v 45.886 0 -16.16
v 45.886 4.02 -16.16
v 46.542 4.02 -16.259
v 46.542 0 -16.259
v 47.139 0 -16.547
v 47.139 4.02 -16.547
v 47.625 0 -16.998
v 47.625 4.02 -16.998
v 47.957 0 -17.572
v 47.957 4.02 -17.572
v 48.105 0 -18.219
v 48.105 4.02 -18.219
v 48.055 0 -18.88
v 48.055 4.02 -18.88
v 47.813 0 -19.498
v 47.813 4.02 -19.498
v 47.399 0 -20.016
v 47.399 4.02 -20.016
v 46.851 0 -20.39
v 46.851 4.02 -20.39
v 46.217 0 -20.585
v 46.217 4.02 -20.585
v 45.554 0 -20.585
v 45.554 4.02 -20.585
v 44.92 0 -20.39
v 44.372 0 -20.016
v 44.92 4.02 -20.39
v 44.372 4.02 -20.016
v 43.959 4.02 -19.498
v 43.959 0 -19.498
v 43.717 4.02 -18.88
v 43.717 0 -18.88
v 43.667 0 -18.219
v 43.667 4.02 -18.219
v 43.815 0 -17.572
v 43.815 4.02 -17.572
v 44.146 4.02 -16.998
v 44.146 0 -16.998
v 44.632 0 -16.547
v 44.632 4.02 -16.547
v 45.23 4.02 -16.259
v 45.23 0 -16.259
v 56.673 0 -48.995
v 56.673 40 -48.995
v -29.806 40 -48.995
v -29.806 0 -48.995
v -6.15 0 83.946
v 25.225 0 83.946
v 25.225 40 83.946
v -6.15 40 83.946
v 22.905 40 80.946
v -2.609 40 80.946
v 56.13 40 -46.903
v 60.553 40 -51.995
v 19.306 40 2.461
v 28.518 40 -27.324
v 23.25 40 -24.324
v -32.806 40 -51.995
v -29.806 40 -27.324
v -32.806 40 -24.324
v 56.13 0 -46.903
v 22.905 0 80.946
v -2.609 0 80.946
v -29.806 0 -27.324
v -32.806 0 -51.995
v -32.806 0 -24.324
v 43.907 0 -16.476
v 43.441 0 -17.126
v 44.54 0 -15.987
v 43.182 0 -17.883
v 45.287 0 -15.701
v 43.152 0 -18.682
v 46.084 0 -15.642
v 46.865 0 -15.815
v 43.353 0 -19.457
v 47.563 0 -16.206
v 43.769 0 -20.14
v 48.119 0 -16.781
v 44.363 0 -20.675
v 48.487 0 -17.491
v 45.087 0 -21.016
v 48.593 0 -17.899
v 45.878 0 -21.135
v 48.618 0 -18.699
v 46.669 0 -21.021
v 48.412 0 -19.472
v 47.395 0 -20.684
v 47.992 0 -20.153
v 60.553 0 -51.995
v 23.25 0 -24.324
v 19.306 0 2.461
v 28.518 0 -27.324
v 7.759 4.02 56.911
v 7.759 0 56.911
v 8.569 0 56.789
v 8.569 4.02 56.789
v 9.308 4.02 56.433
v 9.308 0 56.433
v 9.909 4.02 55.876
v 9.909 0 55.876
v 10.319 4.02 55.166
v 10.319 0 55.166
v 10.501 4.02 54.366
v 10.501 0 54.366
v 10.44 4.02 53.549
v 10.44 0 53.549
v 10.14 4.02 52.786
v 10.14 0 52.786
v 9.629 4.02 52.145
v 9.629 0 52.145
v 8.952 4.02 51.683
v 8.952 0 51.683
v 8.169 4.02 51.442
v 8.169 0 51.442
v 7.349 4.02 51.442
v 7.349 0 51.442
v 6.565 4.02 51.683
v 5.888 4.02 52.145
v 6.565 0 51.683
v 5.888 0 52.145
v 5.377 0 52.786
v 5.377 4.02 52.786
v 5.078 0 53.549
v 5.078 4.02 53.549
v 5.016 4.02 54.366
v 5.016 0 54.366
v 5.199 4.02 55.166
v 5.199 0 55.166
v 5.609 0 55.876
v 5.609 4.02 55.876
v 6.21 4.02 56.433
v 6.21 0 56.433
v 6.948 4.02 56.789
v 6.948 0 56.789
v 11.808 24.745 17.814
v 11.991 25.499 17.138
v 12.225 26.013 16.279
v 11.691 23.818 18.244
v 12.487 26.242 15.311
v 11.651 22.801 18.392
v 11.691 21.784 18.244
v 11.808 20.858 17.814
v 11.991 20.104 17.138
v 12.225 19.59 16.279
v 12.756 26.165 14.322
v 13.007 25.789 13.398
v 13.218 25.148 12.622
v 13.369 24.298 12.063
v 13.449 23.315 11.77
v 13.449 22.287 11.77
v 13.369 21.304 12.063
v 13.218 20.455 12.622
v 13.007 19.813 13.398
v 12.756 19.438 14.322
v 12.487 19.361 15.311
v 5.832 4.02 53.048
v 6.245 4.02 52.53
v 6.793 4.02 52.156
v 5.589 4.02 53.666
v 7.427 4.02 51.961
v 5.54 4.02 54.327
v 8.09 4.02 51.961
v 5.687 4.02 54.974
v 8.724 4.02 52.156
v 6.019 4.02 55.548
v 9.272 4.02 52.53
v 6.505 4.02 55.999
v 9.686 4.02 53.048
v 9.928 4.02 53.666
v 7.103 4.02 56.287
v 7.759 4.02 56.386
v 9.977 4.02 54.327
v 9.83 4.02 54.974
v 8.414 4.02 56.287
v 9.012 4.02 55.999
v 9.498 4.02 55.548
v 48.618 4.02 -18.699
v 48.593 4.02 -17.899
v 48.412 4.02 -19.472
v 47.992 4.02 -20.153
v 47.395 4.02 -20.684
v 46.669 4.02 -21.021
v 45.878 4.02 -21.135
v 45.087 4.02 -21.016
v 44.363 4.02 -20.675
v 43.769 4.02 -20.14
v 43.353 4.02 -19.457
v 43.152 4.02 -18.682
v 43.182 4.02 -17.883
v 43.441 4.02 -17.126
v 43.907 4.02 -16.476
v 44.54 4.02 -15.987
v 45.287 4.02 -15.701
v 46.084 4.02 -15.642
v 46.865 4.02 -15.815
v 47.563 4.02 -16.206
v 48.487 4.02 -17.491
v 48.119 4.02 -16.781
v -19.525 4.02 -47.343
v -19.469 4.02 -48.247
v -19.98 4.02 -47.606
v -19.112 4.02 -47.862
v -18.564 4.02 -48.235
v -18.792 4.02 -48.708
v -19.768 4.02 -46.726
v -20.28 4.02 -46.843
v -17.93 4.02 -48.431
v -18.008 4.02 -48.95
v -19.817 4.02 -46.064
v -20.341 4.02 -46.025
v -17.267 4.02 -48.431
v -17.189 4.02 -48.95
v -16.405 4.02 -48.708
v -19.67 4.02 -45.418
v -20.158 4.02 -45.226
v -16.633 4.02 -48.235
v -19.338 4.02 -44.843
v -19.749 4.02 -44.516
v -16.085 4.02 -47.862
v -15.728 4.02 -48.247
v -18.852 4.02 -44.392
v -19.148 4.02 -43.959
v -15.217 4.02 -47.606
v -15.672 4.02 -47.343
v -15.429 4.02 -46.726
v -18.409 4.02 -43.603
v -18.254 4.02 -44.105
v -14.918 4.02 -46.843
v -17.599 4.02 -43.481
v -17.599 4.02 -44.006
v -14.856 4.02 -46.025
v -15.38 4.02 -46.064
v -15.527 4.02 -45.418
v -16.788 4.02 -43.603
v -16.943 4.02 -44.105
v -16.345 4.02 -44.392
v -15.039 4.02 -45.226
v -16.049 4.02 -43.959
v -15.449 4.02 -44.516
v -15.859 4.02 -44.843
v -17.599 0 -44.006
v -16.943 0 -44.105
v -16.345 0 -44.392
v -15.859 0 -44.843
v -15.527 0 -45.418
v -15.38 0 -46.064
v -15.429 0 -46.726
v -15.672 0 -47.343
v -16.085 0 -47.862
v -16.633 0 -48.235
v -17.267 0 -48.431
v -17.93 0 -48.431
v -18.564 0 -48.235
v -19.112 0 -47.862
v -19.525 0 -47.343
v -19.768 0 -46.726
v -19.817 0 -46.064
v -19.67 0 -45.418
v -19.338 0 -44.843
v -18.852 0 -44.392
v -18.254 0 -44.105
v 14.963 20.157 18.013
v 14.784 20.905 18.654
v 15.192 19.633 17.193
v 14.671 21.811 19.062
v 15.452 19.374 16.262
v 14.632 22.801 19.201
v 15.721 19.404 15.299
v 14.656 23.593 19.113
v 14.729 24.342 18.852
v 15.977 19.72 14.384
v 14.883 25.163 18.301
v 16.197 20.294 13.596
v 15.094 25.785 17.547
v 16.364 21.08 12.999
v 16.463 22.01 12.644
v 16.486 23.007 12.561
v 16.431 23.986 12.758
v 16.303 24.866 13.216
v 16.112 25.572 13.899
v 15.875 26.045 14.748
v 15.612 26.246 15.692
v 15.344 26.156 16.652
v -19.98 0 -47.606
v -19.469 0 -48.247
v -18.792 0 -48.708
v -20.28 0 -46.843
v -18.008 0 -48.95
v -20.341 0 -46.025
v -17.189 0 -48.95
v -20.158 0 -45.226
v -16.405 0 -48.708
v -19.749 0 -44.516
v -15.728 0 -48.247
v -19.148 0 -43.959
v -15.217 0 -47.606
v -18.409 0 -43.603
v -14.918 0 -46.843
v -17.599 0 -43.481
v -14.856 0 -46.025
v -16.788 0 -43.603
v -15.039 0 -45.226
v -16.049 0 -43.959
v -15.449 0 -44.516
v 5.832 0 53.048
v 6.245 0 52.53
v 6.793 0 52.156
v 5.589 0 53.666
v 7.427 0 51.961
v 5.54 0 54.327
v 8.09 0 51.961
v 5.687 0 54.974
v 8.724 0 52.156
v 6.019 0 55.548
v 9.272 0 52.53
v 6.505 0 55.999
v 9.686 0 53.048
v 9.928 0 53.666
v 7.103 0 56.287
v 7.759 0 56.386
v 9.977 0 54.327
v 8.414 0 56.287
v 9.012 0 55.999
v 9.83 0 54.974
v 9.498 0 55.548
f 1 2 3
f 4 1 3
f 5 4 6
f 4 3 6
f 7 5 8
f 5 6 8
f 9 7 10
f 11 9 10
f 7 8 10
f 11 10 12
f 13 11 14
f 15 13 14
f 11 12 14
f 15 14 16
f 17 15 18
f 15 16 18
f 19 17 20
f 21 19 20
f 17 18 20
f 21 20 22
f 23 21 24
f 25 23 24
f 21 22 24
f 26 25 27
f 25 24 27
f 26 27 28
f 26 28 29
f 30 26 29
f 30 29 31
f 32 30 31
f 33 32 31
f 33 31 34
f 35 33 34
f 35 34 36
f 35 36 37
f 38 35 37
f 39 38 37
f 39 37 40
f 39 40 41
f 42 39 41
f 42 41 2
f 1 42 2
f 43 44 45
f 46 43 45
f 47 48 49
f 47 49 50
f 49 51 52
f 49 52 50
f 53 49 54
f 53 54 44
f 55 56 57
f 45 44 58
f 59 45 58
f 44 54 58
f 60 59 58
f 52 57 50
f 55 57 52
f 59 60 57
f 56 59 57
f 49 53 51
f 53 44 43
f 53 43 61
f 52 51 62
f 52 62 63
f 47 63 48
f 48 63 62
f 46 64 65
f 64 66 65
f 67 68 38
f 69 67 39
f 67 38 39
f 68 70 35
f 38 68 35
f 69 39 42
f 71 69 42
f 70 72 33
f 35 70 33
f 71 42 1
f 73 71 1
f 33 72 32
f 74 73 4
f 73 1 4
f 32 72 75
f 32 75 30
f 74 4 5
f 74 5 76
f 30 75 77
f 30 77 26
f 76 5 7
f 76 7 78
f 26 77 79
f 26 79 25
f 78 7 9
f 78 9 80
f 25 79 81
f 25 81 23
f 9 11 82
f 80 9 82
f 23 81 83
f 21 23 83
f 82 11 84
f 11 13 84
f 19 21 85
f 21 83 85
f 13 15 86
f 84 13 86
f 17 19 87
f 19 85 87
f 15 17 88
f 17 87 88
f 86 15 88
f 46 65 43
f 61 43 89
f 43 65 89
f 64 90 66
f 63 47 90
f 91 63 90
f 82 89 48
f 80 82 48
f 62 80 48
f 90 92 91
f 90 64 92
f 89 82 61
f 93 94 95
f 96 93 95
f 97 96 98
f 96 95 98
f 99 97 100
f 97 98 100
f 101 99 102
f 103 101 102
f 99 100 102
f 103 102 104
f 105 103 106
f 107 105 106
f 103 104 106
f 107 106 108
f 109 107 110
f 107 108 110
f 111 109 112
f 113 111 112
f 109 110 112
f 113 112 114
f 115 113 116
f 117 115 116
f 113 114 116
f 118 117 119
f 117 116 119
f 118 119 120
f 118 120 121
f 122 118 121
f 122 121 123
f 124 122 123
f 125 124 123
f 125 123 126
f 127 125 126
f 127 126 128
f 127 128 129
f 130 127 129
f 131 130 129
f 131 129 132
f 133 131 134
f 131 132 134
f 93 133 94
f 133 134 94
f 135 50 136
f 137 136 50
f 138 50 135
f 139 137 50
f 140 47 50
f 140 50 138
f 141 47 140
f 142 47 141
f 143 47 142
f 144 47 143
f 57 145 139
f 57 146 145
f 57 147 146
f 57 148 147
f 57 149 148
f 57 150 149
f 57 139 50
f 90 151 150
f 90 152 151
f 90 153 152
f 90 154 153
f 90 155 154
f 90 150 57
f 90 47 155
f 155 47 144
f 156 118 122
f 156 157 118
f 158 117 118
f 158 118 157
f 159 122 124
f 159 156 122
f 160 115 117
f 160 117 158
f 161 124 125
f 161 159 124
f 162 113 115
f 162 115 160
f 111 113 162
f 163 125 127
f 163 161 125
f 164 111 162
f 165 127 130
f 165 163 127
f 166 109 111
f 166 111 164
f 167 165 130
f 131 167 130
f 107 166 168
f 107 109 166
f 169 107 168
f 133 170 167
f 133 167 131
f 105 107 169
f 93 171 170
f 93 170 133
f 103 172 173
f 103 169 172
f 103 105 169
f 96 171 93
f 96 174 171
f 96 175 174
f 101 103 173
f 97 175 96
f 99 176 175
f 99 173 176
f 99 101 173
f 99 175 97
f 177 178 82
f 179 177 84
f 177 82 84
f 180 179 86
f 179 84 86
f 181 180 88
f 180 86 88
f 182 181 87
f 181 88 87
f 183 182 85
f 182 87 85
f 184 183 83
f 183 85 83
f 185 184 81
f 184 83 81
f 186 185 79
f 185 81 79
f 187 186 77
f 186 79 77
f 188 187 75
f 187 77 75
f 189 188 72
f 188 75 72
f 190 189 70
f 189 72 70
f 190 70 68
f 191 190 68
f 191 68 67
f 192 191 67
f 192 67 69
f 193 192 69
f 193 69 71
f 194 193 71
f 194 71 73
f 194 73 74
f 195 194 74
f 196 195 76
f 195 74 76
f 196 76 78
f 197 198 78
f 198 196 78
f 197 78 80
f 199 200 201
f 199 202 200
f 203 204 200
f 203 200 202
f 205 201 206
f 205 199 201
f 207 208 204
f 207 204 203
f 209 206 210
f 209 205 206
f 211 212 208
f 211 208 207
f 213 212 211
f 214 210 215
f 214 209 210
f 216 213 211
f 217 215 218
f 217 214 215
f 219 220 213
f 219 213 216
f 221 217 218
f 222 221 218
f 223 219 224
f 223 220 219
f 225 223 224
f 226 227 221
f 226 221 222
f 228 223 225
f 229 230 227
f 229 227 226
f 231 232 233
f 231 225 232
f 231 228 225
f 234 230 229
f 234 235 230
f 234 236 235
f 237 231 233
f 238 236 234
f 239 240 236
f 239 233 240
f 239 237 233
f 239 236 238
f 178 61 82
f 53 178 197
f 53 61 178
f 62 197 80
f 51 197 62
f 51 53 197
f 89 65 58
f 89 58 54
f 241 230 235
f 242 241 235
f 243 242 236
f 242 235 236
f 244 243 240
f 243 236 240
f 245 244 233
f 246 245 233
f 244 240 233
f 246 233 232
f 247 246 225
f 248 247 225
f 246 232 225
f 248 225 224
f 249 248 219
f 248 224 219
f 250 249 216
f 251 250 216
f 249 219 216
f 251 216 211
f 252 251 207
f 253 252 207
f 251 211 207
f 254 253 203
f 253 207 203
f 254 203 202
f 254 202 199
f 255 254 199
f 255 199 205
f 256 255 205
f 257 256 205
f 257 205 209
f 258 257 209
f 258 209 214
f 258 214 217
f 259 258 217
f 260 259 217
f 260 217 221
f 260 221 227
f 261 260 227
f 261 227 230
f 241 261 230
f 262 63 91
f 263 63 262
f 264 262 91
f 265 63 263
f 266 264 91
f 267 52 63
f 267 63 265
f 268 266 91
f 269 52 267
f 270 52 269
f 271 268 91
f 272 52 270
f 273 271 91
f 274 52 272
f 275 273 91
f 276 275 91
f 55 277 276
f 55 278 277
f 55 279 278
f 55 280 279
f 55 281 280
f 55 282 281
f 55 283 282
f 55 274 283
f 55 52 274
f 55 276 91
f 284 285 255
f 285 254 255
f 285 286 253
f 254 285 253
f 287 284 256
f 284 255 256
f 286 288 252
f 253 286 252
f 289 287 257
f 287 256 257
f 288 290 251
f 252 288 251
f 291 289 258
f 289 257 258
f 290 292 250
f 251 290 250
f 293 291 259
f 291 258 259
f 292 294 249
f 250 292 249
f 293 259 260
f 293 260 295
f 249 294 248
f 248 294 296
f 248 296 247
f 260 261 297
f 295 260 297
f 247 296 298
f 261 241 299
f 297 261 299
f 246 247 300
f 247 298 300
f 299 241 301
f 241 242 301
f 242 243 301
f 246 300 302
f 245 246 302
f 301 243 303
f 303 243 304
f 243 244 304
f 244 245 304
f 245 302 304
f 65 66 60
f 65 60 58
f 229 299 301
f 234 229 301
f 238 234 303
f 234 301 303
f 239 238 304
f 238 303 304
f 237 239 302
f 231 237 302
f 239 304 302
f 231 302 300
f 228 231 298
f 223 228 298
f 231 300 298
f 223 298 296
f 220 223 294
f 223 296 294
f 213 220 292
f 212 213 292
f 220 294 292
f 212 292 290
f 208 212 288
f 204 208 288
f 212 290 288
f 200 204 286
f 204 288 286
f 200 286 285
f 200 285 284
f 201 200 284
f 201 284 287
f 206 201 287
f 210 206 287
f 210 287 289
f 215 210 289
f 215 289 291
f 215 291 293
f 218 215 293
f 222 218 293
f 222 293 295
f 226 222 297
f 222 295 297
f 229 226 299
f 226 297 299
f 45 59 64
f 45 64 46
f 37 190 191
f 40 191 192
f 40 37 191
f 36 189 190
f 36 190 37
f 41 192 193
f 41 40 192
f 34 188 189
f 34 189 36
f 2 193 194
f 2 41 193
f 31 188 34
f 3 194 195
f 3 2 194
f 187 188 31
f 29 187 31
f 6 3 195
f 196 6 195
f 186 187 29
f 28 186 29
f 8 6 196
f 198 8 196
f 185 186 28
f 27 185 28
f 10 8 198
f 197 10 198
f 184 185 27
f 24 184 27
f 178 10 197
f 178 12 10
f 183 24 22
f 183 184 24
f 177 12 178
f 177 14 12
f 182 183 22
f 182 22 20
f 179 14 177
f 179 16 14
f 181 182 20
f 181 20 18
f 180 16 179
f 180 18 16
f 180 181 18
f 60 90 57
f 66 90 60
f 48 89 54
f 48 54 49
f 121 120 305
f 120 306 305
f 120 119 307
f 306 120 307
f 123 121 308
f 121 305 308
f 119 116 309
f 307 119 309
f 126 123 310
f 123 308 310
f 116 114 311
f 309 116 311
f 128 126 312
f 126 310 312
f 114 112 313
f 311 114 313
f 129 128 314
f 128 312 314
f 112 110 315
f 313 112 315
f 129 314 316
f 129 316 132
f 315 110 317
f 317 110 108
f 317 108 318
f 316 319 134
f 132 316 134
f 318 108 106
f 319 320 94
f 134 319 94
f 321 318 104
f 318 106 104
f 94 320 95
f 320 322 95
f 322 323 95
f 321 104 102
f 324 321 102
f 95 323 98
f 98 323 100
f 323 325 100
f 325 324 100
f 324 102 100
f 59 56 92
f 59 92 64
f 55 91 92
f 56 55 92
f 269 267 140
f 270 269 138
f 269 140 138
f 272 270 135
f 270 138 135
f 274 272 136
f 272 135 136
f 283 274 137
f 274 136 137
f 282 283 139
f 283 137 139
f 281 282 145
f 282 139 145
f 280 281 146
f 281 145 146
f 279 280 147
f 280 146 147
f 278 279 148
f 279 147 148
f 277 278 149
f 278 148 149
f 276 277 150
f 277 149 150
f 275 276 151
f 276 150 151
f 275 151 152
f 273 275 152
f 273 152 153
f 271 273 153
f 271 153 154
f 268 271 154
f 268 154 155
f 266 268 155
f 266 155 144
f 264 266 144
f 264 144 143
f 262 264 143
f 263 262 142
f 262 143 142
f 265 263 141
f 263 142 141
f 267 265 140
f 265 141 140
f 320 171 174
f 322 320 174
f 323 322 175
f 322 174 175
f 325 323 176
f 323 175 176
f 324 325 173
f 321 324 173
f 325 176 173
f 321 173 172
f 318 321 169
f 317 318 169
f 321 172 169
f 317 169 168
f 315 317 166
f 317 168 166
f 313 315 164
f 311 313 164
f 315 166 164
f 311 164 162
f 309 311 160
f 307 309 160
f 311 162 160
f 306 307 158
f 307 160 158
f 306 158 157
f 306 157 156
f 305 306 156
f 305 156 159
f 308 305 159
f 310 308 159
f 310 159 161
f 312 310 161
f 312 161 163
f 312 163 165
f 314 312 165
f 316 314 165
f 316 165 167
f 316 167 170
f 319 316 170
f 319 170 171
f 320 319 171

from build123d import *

# Parameters (mm, degrees)
BOSS_EXTRUDE1_DEPTH = 40
CUT_EXTRUDE1_DEPTH  = 111.966839961
SKETCH6_R           = 3.45
CUT_EXTRUDE2_DEPTH  = 10
SKETCH7_R           = 2.75
BOSS_EXTRUDE3_DEPTH = 4.02
SKETCH8_R           = 2.225
CUT_EXTRUDE3_DEPTH  = 110.581932685


with BuildPart() as part:
    # Sketch1 → Boss-Extrude1 (new body)
    with BuildSketch(Plane(origin=(0, 0, 0), x_dir=(1, 0, 0), z_dir=(0, 1, 0))):
        Polygon((-32.806430064, 51.994551896), (60.552740485, 51.994551896), (25.225039266, -83.946442395), (-6.149932227, -83.946442395), (23.249976258, 24.323717363), (-32.806430064, 24.323717363), align=None)
    extrude(amount=BOSS_EXTRUDE1_DEPTH)

    # Sketch3 → Cut-Extrude1 (cut, through all)
    with BuildSketch(Plane(origin=(0, 40, 0), x_dir=(1, 0, 0), z_dir=(0, 1, 0))):
        Polygon((56.180799988, 48.994551896), (56.673466926, 48.994551896), (56.129977884, 46.90320606), (22.905017266, -80.946442395), (-2.608781808, -80.946442395), (19.305922239, -2.461259631), (28.517713947, 27.323717363), (-29.806430064, 27.323717363), (-29.806430064, 48.994551896), (-0.992743821, 48.994551896), align=None)
    extrude(amount=-CUT_EXTRUDE1_DEPTH, mode=Mode.SUBTRACT)

    # Sketch6 → Cut-Extrude2 (cut)
    with BuildSketch(Plane(origin=(15.502019252, 0, 4.209451139), x_dir=(-0.2620526895610605, 0, 0.9650535673701303), z_dir=(-0.9650535673701304, 0, -0.2620526895610605))):
        with Locations((11.246173588, 22.801195515)):
            Circle(SKETCH6_R)
    extrude(amount=-CUT_EXTRUDE2_DEPTH, mode=Mode.SUBTRACT)

    # Sketch7 → Boss-Extrude3 (add)
    with BuildSketch(Plane(origin=(0, 0, 0), x_dir=(1, 0, 0), z_dir=(0, 1, 0))):
        with Locations(Location((-17.598579061, 46.230759465, 0), (0, 0, 270))):
            Circle(SKETCH7_R)
        with Locations((45.885843259, 18.385111047)):
            Circle(SKETCH7_R)
        with Locations(Location((7.758668696, -54.160966994, 0), (0, 0, 270))):
            Circle(SKETCH7_R)
    extrude(amount=BOSS_EXTRUDE3_DEPTH)


with BuildPart() as boss_extrude3_piece_1:
    # of the separate pieces the step leaves, piece 1, a body of its own (boss_extrude3_pieces)
    add(part.part.solids().sort_by_distance((-32.806430064, 0, -51.994551896))[0])


with BuildPart() as boss_extrude3_piece_2:
    # of the separate pieces the step leaves, piece 2, a body of its own (boss_extrude3_pieces)
    add(part.part.solids().sort_by_distance((7.758668696, 0, 56.910966994))[0])


with BuildPart() as boss_extrude3_piece_3:
    # of the separate pieces the step leaves, piece 3, a body of its own (boss_extrude3_pieces)
    add(part.part.solids().sort_by_distance((-17.598579061, 0, -43.480759465))[0])


with BuildPart() as cut_extrude3_tool:
    # Sketch8 → Cut-Extrude3 (new, through all)
    with BuildSketch(Plane(origin=(0, 4.02, 0), x_dir=(1, 0, 0), z_dir=(0, 1, 0))):
        with Locations(Location((-17.598579061, 46.230759465, 0), (0, 0, 270))):
            Circle(SKETCH8_R)
        with Locations(Location((45.885843259, 18.385111047, 0), (0, 0, 270))):
            Circle(SKETCH8_R)
        with Locations(Location((7.758668696, -54.160966994, 0), (0, 0, 270))):
            Circle(SKETCH8_R)
    extrude(amount=-CUT_EXTRUDE3_DEPTH)


with BuildPart() as boss_extrude3_piece_1_1:
    add(boss_extrude3_piece_1.part)

    # Cut-Extrude3: cut by cut_extrude3_tool
    add(cut_extrude3_tool.part, mode=Mode.SUBTRACT)


with BuildPart() as boss_extrude3_piece_2_1:
    add(boss_extrude3_piece_2.part)

    # Cut-Extrude3: cut by cut_extrude3_tool
    add(cut_extrude3_tool.part, mode=Mode.SUBTRACT)


with BuildPart() as boss_extrude3_piece_3_1:
    add(boss_extrude3_piece_3.part)

    # Cut-Extrude3: cut by cut_extrude3_tool
    add(cut_extrude3_tool.part, mode=Mode.SUBTRACT)


solid = Compound([boss_extrude3_piece_1_1.part, boss_extrude3_piece_2_1.part, boss_extrude3_piece_3_1.part])
